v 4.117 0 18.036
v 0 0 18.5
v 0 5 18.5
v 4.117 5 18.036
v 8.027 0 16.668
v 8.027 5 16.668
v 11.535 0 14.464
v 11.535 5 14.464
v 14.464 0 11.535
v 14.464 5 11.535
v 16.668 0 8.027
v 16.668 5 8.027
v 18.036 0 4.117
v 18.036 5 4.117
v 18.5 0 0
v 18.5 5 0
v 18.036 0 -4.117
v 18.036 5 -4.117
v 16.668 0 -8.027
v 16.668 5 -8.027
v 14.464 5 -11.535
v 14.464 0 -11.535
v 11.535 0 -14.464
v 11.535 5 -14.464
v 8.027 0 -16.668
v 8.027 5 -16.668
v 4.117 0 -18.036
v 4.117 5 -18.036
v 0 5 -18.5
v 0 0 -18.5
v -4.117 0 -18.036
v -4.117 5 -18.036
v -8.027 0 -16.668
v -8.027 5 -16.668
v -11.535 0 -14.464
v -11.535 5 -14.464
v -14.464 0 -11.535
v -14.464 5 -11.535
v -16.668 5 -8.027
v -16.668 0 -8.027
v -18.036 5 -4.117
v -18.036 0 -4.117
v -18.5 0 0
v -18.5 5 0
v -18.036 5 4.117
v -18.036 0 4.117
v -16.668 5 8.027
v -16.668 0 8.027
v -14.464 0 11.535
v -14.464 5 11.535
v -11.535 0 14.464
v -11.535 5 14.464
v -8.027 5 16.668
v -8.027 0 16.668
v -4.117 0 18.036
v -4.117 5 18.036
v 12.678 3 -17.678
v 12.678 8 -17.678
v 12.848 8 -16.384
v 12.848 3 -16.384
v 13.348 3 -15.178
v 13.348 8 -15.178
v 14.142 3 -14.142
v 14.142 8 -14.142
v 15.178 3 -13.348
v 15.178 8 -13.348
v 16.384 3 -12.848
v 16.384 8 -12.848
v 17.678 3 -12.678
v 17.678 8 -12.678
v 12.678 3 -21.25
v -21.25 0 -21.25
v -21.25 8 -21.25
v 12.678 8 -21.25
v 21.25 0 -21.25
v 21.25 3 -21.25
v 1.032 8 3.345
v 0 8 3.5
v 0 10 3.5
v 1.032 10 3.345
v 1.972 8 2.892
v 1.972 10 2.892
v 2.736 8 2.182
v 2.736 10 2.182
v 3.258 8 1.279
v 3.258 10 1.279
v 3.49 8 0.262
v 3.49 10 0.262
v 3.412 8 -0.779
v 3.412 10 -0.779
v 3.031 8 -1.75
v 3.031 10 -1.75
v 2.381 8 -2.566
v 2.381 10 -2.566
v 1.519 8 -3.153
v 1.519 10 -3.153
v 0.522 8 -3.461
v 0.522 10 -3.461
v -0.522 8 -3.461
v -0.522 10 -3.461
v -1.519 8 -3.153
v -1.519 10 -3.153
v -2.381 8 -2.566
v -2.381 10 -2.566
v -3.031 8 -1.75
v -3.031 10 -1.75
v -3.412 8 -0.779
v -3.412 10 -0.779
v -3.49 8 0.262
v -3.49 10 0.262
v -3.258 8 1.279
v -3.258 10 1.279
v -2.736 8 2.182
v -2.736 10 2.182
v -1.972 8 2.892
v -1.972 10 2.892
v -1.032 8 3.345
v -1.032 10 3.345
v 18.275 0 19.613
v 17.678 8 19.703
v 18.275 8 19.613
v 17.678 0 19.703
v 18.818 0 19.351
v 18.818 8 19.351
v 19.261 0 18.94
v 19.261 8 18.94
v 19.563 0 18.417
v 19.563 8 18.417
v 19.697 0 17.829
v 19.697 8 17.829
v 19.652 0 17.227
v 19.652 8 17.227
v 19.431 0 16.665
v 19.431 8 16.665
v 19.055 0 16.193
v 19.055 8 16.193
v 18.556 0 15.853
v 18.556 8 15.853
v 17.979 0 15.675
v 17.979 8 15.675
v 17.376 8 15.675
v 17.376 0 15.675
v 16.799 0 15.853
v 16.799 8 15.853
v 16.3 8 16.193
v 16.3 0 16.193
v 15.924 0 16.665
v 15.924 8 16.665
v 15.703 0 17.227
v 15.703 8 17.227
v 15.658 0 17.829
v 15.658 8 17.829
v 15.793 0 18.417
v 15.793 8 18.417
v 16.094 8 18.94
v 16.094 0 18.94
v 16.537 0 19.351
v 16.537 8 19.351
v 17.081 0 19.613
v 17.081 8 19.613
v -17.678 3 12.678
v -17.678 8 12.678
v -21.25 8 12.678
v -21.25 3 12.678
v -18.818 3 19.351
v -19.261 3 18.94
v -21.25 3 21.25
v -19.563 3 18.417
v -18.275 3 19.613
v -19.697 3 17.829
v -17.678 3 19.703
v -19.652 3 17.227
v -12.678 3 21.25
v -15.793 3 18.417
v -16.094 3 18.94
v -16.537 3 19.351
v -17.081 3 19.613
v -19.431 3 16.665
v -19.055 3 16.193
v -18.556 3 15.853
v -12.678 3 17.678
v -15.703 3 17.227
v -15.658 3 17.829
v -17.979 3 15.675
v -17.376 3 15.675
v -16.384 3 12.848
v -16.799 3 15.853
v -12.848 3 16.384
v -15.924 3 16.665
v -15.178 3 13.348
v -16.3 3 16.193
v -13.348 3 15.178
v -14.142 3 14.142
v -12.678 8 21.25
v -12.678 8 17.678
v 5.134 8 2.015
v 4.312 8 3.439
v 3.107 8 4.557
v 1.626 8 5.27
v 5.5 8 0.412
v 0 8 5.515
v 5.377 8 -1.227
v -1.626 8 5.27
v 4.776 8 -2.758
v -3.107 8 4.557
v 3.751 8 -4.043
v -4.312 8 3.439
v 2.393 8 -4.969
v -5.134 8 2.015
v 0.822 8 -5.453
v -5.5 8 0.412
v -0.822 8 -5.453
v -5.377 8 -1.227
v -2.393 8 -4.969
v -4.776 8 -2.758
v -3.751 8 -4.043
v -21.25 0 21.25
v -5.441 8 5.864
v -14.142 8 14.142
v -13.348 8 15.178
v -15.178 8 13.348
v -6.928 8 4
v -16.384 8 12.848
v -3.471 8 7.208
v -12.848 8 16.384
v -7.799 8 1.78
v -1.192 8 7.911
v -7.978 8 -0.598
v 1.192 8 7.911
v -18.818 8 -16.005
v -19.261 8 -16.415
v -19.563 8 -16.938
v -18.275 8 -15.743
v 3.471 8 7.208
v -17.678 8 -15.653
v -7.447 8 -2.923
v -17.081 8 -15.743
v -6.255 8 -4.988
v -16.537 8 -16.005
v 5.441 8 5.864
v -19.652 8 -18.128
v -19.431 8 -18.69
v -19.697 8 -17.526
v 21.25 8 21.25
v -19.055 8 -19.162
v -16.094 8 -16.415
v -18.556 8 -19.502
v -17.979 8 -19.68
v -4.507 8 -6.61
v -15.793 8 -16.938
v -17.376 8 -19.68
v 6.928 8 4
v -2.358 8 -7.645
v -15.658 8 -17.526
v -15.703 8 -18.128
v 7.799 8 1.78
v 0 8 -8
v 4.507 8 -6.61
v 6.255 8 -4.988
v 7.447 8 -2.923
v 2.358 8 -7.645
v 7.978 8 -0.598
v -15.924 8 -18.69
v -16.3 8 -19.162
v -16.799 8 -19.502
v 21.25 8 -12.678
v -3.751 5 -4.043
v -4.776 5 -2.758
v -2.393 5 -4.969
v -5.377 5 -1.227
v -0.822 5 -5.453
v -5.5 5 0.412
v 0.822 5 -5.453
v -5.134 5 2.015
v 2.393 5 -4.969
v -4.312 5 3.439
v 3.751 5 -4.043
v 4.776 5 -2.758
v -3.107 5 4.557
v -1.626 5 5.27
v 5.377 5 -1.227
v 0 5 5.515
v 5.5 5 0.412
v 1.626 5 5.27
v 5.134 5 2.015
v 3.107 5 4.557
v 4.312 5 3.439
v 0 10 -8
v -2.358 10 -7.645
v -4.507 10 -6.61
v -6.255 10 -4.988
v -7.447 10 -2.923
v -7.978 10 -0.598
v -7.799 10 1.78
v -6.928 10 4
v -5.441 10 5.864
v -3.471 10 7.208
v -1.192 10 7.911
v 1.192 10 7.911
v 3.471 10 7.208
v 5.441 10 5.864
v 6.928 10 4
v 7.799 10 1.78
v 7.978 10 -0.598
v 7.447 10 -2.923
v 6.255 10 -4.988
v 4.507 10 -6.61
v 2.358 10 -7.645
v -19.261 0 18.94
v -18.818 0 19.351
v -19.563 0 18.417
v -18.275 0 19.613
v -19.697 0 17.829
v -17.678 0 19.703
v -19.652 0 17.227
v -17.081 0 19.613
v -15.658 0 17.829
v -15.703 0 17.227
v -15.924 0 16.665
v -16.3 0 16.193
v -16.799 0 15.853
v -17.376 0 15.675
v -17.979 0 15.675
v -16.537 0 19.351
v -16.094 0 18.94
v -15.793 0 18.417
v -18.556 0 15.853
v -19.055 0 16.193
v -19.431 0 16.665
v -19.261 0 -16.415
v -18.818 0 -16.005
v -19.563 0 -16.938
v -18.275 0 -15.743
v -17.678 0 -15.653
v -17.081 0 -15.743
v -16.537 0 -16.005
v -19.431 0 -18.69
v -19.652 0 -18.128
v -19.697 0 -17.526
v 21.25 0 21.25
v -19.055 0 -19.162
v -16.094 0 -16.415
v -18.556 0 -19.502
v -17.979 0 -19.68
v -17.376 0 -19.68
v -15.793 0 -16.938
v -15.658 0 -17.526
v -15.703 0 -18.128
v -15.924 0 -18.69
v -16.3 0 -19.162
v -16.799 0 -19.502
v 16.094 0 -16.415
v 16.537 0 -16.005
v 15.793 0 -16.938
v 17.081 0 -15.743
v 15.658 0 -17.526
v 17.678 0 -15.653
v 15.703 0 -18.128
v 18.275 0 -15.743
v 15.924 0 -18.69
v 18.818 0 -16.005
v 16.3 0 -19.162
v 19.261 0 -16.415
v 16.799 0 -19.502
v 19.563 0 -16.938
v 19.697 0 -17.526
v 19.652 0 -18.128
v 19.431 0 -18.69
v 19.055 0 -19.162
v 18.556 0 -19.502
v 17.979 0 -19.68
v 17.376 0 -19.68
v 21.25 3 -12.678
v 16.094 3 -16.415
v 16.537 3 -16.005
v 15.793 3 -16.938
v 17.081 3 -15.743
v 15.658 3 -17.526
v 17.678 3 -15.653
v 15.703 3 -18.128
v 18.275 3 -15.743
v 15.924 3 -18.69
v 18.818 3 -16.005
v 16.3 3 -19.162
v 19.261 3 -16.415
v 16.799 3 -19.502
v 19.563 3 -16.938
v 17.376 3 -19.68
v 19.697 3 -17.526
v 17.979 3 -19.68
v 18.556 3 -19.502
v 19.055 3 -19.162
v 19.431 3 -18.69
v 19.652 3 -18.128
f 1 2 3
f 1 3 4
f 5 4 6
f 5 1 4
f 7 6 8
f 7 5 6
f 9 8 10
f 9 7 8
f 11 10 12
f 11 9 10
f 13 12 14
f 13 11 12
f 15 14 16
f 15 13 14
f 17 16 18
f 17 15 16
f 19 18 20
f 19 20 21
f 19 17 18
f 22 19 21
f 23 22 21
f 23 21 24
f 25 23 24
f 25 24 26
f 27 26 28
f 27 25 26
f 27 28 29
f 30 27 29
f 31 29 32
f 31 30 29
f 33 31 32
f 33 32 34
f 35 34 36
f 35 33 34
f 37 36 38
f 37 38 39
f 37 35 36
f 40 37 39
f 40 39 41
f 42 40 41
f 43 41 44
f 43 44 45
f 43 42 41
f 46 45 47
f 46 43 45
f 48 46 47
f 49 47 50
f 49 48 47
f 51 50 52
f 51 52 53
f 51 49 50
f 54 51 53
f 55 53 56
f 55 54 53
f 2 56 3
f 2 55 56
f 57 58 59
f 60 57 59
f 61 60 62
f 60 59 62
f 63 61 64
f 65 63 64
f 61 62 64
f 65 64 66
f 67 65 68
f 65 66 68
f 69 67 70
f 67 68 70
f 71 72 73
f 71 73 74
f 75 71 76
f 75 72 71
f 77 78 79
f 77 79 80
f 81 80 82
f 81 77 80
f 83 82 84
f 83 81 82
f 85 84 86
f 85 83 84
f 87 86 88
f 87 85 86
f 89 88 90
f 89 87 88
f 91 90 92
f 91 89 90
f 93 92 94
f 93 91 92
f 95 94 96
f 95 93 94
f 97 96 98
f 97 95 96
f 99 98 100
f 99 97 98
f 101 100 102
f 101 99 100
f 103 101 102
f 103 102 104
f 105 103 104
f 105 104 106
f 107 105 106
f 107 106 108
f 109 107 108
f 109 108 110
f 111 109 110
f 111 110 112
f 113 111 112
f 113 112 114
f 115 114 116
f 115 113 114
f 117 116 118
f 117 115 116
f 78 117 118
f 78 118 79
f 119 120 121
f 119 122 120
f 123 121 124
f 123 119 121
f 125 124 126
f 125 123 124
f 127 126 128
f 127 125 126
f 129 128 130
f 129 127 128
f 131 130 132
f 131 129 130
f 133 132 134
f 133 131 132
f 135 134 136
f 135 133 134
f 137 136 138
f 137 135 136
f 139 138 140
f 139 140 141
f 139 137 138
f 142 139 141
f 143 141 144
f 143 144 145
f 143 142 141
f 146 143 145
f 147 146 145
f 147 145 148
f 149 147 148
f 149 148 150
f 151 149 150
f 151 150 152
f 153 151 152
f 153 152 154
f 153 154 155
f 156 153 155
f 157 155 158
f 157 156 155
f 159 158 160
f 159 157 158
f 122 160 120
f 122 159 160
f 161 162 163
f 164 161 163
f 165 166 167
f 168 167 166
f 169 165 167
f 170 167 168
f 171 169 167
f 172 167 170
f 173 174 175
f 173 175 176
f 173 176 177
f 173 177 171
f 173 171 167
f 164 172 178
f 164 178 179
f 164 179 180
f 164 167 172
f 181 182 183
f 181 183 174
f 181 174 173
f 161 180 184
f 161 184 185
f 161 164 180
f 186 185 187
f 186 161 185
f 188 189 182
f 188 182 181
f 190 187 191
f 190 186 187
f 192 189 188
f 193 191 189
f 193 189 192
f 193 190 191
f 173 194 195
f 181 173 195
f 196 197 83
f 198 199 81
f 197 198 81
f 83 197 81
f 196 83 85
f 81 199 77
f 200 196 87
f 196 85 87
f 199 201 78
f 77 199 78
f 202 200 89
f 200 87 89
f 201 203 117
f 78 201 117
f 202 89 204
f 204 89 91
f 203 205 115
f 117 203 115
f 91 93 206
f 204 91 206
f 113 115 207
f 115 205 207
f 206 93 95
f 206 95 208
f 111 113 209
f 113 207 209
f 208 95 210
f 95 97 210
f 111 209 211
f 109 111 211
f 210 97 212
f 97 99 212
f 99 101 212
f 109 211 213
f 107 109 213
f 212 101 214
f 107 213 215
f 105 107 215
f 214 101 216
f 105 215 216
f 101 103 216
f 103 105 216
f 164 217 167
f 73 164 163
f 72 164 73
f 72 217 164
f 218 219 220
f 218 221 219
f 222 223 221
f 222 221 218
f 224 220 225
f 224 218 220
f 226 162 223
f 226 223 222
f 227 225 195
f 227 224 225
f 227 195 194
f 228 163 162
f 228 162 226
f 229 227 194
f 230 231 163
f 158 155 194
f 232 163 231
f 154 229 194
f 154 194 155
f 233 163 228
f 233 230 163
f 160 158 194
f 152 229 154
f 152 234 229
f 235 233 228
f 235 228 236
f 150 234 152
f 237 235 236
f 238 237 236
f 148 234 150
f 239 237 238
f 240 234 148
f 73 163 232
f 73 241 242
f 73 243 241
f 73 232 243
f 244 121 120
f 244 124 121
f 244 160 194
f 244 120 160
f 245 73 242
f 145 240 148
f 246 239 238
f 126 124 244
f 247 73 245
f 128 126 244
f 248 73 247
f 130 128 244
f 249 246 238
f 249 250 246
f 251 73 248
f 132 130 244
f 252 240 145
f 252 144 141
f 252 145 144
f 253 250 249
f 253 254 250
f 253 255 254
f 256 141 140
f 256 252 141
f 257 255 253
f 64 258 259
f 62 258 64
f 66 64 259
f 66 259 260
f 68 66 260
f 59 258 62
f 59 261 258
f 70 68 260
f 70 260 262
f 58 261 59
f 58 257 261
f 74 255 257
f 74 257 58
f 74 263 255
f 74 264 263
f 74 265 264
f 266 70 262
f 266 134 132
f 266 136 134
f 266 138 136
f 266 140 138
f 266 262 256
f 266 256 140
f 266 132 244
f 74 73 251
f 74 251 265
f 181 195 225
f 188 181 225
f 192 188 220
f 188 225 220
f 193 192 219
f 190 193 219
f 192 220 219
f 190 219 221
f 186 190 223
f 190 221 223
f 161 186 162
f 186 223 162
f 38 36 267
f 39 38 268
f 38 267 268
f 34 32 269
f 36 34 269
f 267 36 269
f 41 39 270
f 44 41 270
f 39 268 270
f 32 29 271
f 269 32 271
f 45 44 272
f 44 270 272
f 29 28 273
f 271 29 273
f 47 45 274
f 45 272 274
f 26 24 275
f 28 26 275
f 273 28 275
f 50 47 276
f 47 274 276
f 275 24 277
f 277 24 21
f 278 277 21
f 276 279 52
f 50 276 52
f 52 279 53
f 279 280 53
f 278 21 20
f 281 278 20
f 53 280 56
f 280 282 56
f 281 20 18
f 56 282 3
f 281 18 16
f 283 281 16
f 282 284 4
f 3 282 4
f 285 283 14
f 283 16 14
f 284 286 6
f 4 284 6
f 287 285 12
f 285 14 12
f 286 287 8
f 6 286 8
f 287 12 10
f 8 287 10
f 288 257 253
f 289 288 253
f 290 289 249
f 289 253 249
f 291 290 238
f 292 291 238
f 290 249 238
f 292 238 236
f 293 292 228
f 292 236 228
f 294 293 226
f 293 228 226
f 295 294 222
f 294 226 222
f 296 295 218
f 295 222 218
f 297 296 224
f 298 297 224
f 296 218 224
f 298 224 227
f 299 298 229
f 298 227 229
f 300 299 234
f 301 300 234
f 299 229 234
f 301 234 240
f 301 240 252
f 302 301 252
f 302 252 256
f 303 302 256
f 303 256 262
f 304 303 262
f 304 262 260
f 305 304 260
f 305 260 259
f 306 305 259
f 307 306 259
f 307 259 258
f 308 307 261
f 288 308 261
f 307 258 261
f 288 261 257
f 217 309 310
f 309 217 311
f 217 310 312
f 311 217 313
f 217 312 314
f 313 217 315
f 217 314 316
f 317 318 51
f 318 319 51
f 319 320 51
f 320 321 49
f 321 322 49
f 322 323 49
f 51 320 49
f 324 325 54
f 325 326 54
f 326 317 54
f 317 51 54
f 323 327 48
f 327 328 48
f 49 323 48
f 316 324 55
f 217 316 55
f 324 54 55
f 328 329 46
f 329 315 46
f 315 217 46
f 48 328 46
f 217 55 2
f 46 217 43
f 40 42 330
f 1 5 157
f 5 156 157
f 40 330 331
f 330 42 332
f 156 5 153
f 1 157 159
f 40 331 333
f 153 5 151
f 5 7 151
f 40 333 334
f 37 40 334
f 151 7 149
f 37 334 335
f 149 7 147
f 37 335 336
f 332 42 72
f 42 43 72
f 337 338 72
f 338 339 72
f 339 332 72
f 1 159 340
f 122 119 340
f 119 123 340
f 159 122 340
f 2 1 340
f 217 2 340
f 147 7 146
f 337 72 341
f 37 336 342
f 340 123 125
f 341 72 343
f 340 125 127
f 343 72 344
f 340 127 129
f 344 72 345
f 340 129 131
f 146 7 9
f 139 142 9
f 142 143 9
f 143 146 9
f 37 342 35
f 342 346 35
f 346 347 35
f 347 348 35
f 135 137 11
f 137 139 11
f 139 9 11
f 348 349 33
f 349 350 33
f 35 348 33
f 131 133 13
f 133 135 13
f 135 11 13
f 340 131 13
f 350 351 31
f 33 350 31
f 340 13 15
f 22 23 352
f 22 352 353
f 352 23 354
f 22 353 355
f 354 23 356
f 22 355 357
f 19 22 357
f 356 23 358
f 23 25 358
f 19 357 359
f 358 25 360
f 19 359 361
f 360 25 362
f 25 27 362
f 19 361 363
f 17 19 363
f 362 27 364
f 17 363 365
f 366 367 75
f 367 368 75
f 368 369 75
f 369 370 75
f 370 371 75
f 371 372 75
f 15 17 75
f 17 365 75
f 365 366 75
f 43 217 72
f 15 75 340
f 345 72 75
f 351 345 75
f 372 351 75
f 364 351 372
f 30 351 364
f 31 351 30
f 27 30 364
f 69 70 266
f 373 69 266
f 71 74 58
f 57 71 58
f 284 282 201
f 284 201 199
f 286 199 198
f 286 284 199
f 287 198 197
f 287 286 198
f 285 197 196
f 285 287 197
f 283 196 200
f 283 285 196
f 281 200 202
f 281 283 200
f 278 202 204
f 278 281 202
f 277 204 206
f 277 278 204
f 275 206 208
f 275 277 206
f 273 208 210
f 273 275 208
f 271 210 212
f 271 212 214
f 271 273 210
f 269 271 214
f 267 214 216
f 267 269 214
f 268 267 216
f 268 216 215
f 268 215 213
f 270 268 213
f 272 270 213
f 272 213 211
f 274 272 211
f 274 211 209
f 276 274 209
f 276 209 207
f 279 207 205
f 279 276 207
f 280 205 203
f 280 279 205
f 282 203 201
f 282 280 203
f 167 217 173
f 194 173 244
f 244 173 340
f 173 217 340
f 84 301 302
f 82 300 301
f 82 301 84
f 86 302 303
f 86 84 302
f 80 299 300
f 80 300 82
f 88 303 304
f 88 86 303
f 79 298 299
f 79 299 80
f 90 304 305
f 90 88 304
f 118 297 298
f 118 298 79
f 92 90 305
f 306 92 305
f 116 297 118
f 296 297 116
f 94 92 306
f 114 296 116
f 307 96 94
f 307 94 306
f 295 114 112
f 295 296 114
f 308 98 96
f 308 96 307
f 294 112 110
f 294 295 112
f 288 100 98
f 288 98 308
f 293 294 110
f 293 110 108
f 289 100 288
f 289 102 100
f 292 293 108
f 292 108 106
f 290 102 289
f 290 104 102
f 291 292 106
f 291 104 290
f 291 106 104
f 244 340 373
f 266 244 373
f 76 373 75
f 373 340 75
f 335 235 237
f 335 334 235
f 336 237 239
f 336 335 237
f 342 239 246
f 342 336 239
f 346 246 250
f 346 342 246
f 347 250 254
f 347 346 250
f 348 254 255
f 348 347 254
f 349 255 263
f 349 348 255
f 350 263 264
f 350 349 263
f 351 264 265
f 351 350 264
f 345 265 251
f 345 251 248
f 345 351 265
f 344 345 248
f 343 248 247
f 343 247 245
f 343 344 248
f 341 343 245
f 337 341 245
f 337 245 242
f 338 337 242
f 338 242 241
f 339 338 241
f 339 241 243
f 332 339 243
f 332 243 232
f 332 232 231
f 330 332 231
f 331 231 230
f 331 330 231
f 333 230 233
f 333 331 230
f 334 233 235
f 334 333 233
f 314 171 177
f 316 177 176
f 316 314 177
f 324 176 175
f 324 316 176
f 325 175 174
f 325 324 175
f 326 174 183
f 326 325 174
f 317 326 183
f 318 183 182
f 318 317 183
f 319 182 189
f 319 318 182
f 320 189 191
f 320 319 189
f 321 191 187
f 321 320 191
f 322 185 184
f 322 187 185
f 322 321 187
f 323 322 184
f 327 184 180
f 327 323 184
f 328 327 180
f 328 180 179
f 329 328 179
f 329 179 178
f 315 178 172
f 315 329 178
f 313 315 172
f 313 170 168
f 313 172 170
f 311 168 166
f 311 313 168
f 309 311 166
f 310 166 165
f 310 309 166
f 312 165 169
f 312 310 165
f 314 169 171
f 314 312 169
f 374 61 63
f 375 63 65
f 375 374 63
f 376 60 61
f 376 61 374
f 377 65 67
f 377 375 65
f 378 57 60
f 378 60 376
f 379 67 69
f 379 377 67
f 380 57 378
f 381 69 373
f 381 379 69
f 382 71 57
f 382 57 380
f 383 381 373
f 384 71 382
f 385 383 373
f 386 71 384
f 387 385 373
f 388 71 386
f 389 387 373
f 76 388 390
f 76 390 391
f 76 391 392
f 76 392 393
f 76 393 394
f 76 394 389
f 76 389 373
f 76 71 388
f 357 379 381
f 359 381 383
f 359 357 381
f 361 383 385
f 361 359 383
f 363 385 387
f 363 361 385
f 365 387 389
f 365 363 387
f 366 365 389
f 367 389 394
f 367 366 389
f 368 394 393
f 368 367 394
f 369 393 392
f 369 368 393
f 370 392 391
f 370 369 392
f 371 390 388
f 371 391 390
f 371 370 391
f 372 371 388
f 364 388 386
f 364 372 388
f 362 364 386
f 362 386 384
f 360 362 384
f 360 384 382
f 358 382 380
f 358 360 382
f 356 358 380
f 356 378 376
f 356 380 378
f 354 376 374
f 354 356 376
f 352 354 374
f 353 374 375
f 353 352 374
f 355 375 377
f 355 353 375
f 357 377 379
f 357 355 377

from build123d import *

# Parameters (mm, degrees)
SKETCH_1_W          = 42.5
SKETCH_1_H          = 42.5
SKETCH_1_R          = 2.025
SKETCH_1_R_2        = 18.5
EXTRUDE_1_DEPTH     = 5
EXTRUDE_START       = 5
SKETCH_1_3_W        = 42.5
SKETCH_1_3_H        = 42.5
SKETCH_1_3_R        = 2.025
SKETCH_1_3_R_2      = 18.5
SKETCH_1_3_R_3      = 5.515
EXTRUDE_2_DEPTH     = 3
CUT_EXTRUDE_1_DEPTH = 5
SKETCH_3_R          = 8
SKETCH_3_R_2        = 3.5
EXTRUDE_3_DEPTH     = 2


with BuildPart() as part:
    # 草图1 → 凸台-拉伸1 (new body)
    with BuildSketch(Plane(origin=(0, 0, 0), x_dir=(1, 0, 0), z_dir=(0, 1, 0))):
        Rectangle(SKETCH_1_W, SKETCH_1_H)
        with Locations(Location((-17.67766953, -17.67766953, 0), (0, 0, 270))):
            Circle(SKETCH_1_R, mode=Mode.SUBTRACT)
        with Locations(Location((17.67766953, -17.67766953, 0), (0, 0, 270))):
            Circle(SKETCH_1_R, mode=Mode.SUBTRACT)
        with Locations(Location((17.67766953, 17.67766953, 0), (0, 0, 270))):
            Circle(SKETCH_1_R, mode=Mode.SUBTRACT)
        with Locations(Location((-17.67766953, 17.67766953, 0), (0, 0, 270))):
            Circle(SKETCH_1_R, mode=Mode.SUBTRACT)
        with Locations(Location((0, 0, 0), (0, 0, 270))):
            Circle(SKETCH_1_R_2, mode=Mode.SUBTRACT)
    extrude(amount=EXTRUDE_1_DEPTH)

    # 草图1<3> → 凸台-拉伸2 (add)
    # profile 1 of 2: a face of its own
    with BuildSketch(Plane(origin=(0, 0, 0), x_dir=(1, 0, 0), z_dir=(0, 1, 0)).offset(EXTRUDE_START)):
        Rectangle(SKETCH_1_3_W, SKETCH_1_3_H)
        with Locations(Location((-17.67766953, -17.67766953, 0), (0, 0, 270))):
            Circle(SKETCH_1_3_R, mode=Mode.SUBTRACT)
        with Locations(Location((17.67766953, -17.67766953, 0), (0, 0, 270))):
            Circle(SKETCH_1_3_R, mode=Mode.SUBTRACT)
        with Locations(Location((17.67766953, 17.67766953, 0), (0, 0, 270))):
            Circle(SKETCH_1_3_R, mode=Mode.SUBTRACT)
        with Locations(Location((-17.67766953, 17.67766953, 0), (0, 0, 270))):
            Circle(SKETCH_1_3_R, mode=Mode.SUBTRACT)
        with Locations(Location((0, 0, 0), (0, 0, 270))):
            Circle(SKETCH_1_3_R_2, mode=Mode.SUBTRACT)
    # profile 2 of 2: a face of its own
    with BuildSketch(Plane(origin=(0, 0, 0), x_dir=(1, 0, 0), z_dir=(0, 1, 0)).offset(EXTRUDE_START)):
        with Locations(Location((0, 0, 0), (0, 0, 270))):
            Circle(SKETCH_1_3_R_2)
        with Locations(Location((0, 0, 0), (0, 0, 270))):
            Circle(SKETCH_1_3_R_3, mode=Mode.SUBTRACT)
    extrude(amount=EXTRUDE_2_DEPTH)

    # 草图2 → 切除-拉伸1 (cut)
    with BuildSketch(Plane(origin=(0, 8, 0), x_dir=(1, 0, 0), z_dir=(0, 1, 0))):
        with BuildLine():
            Line((-17.67766953, -12.67766953), (-21.25, -12.67766953))
            Line((-21.25, -12.67766953), (-21.25, -21.25))
            Line((-21.25, -21.25), (-12.67766953, -21.25))
            Line((-12.67766953, -21.25), (-12.67766953, -17.67766953))
            ThreePointArc((-12.67766953, -17.67766953), (-14.142135624, -14.142135624), (-17.67766953, -12.67766953))
        make_face()
        with BuildLine():
            Line((21.25, 21.25), (12.67766953, 21.25))
            Line((12.67766953, 21.25), (12.67766953, 17.67766953))
            ThreePointArc((12.67766953, 17.67766953), (14.142135624, 14.142135624), (17.67766953, 12.67766953))
            Line((17.67766953, 12.67766953), (21.25, 12.67766953))
            Line((21.25, 12.67766953), (21.25, 21.25))
        make_face()
    extrude(amount=-CUT_EXTRUDE_1_DEPTH, mode=Mode.SUBTRACT)

    # 草图3 → 凸台-拉伸3 (add)
    with BuildSketch(Plane(origin=(0, 8, 0), x_dir=(1, 0, 0), z_dir=(0, 1, 0))):
        with Locations(Location((0, 0, 0), (0, 0, 90))):
            Circle(SKETCH_3_R)
        with Locations(Location((0, 0, 0), (0, 0, 270))):
            Circle(SKETCH_3_R_2, mode=Mode.SUBTRACT)
    extrude(amount=EXTRUDE_3_DEPTH)


solid = part.part
